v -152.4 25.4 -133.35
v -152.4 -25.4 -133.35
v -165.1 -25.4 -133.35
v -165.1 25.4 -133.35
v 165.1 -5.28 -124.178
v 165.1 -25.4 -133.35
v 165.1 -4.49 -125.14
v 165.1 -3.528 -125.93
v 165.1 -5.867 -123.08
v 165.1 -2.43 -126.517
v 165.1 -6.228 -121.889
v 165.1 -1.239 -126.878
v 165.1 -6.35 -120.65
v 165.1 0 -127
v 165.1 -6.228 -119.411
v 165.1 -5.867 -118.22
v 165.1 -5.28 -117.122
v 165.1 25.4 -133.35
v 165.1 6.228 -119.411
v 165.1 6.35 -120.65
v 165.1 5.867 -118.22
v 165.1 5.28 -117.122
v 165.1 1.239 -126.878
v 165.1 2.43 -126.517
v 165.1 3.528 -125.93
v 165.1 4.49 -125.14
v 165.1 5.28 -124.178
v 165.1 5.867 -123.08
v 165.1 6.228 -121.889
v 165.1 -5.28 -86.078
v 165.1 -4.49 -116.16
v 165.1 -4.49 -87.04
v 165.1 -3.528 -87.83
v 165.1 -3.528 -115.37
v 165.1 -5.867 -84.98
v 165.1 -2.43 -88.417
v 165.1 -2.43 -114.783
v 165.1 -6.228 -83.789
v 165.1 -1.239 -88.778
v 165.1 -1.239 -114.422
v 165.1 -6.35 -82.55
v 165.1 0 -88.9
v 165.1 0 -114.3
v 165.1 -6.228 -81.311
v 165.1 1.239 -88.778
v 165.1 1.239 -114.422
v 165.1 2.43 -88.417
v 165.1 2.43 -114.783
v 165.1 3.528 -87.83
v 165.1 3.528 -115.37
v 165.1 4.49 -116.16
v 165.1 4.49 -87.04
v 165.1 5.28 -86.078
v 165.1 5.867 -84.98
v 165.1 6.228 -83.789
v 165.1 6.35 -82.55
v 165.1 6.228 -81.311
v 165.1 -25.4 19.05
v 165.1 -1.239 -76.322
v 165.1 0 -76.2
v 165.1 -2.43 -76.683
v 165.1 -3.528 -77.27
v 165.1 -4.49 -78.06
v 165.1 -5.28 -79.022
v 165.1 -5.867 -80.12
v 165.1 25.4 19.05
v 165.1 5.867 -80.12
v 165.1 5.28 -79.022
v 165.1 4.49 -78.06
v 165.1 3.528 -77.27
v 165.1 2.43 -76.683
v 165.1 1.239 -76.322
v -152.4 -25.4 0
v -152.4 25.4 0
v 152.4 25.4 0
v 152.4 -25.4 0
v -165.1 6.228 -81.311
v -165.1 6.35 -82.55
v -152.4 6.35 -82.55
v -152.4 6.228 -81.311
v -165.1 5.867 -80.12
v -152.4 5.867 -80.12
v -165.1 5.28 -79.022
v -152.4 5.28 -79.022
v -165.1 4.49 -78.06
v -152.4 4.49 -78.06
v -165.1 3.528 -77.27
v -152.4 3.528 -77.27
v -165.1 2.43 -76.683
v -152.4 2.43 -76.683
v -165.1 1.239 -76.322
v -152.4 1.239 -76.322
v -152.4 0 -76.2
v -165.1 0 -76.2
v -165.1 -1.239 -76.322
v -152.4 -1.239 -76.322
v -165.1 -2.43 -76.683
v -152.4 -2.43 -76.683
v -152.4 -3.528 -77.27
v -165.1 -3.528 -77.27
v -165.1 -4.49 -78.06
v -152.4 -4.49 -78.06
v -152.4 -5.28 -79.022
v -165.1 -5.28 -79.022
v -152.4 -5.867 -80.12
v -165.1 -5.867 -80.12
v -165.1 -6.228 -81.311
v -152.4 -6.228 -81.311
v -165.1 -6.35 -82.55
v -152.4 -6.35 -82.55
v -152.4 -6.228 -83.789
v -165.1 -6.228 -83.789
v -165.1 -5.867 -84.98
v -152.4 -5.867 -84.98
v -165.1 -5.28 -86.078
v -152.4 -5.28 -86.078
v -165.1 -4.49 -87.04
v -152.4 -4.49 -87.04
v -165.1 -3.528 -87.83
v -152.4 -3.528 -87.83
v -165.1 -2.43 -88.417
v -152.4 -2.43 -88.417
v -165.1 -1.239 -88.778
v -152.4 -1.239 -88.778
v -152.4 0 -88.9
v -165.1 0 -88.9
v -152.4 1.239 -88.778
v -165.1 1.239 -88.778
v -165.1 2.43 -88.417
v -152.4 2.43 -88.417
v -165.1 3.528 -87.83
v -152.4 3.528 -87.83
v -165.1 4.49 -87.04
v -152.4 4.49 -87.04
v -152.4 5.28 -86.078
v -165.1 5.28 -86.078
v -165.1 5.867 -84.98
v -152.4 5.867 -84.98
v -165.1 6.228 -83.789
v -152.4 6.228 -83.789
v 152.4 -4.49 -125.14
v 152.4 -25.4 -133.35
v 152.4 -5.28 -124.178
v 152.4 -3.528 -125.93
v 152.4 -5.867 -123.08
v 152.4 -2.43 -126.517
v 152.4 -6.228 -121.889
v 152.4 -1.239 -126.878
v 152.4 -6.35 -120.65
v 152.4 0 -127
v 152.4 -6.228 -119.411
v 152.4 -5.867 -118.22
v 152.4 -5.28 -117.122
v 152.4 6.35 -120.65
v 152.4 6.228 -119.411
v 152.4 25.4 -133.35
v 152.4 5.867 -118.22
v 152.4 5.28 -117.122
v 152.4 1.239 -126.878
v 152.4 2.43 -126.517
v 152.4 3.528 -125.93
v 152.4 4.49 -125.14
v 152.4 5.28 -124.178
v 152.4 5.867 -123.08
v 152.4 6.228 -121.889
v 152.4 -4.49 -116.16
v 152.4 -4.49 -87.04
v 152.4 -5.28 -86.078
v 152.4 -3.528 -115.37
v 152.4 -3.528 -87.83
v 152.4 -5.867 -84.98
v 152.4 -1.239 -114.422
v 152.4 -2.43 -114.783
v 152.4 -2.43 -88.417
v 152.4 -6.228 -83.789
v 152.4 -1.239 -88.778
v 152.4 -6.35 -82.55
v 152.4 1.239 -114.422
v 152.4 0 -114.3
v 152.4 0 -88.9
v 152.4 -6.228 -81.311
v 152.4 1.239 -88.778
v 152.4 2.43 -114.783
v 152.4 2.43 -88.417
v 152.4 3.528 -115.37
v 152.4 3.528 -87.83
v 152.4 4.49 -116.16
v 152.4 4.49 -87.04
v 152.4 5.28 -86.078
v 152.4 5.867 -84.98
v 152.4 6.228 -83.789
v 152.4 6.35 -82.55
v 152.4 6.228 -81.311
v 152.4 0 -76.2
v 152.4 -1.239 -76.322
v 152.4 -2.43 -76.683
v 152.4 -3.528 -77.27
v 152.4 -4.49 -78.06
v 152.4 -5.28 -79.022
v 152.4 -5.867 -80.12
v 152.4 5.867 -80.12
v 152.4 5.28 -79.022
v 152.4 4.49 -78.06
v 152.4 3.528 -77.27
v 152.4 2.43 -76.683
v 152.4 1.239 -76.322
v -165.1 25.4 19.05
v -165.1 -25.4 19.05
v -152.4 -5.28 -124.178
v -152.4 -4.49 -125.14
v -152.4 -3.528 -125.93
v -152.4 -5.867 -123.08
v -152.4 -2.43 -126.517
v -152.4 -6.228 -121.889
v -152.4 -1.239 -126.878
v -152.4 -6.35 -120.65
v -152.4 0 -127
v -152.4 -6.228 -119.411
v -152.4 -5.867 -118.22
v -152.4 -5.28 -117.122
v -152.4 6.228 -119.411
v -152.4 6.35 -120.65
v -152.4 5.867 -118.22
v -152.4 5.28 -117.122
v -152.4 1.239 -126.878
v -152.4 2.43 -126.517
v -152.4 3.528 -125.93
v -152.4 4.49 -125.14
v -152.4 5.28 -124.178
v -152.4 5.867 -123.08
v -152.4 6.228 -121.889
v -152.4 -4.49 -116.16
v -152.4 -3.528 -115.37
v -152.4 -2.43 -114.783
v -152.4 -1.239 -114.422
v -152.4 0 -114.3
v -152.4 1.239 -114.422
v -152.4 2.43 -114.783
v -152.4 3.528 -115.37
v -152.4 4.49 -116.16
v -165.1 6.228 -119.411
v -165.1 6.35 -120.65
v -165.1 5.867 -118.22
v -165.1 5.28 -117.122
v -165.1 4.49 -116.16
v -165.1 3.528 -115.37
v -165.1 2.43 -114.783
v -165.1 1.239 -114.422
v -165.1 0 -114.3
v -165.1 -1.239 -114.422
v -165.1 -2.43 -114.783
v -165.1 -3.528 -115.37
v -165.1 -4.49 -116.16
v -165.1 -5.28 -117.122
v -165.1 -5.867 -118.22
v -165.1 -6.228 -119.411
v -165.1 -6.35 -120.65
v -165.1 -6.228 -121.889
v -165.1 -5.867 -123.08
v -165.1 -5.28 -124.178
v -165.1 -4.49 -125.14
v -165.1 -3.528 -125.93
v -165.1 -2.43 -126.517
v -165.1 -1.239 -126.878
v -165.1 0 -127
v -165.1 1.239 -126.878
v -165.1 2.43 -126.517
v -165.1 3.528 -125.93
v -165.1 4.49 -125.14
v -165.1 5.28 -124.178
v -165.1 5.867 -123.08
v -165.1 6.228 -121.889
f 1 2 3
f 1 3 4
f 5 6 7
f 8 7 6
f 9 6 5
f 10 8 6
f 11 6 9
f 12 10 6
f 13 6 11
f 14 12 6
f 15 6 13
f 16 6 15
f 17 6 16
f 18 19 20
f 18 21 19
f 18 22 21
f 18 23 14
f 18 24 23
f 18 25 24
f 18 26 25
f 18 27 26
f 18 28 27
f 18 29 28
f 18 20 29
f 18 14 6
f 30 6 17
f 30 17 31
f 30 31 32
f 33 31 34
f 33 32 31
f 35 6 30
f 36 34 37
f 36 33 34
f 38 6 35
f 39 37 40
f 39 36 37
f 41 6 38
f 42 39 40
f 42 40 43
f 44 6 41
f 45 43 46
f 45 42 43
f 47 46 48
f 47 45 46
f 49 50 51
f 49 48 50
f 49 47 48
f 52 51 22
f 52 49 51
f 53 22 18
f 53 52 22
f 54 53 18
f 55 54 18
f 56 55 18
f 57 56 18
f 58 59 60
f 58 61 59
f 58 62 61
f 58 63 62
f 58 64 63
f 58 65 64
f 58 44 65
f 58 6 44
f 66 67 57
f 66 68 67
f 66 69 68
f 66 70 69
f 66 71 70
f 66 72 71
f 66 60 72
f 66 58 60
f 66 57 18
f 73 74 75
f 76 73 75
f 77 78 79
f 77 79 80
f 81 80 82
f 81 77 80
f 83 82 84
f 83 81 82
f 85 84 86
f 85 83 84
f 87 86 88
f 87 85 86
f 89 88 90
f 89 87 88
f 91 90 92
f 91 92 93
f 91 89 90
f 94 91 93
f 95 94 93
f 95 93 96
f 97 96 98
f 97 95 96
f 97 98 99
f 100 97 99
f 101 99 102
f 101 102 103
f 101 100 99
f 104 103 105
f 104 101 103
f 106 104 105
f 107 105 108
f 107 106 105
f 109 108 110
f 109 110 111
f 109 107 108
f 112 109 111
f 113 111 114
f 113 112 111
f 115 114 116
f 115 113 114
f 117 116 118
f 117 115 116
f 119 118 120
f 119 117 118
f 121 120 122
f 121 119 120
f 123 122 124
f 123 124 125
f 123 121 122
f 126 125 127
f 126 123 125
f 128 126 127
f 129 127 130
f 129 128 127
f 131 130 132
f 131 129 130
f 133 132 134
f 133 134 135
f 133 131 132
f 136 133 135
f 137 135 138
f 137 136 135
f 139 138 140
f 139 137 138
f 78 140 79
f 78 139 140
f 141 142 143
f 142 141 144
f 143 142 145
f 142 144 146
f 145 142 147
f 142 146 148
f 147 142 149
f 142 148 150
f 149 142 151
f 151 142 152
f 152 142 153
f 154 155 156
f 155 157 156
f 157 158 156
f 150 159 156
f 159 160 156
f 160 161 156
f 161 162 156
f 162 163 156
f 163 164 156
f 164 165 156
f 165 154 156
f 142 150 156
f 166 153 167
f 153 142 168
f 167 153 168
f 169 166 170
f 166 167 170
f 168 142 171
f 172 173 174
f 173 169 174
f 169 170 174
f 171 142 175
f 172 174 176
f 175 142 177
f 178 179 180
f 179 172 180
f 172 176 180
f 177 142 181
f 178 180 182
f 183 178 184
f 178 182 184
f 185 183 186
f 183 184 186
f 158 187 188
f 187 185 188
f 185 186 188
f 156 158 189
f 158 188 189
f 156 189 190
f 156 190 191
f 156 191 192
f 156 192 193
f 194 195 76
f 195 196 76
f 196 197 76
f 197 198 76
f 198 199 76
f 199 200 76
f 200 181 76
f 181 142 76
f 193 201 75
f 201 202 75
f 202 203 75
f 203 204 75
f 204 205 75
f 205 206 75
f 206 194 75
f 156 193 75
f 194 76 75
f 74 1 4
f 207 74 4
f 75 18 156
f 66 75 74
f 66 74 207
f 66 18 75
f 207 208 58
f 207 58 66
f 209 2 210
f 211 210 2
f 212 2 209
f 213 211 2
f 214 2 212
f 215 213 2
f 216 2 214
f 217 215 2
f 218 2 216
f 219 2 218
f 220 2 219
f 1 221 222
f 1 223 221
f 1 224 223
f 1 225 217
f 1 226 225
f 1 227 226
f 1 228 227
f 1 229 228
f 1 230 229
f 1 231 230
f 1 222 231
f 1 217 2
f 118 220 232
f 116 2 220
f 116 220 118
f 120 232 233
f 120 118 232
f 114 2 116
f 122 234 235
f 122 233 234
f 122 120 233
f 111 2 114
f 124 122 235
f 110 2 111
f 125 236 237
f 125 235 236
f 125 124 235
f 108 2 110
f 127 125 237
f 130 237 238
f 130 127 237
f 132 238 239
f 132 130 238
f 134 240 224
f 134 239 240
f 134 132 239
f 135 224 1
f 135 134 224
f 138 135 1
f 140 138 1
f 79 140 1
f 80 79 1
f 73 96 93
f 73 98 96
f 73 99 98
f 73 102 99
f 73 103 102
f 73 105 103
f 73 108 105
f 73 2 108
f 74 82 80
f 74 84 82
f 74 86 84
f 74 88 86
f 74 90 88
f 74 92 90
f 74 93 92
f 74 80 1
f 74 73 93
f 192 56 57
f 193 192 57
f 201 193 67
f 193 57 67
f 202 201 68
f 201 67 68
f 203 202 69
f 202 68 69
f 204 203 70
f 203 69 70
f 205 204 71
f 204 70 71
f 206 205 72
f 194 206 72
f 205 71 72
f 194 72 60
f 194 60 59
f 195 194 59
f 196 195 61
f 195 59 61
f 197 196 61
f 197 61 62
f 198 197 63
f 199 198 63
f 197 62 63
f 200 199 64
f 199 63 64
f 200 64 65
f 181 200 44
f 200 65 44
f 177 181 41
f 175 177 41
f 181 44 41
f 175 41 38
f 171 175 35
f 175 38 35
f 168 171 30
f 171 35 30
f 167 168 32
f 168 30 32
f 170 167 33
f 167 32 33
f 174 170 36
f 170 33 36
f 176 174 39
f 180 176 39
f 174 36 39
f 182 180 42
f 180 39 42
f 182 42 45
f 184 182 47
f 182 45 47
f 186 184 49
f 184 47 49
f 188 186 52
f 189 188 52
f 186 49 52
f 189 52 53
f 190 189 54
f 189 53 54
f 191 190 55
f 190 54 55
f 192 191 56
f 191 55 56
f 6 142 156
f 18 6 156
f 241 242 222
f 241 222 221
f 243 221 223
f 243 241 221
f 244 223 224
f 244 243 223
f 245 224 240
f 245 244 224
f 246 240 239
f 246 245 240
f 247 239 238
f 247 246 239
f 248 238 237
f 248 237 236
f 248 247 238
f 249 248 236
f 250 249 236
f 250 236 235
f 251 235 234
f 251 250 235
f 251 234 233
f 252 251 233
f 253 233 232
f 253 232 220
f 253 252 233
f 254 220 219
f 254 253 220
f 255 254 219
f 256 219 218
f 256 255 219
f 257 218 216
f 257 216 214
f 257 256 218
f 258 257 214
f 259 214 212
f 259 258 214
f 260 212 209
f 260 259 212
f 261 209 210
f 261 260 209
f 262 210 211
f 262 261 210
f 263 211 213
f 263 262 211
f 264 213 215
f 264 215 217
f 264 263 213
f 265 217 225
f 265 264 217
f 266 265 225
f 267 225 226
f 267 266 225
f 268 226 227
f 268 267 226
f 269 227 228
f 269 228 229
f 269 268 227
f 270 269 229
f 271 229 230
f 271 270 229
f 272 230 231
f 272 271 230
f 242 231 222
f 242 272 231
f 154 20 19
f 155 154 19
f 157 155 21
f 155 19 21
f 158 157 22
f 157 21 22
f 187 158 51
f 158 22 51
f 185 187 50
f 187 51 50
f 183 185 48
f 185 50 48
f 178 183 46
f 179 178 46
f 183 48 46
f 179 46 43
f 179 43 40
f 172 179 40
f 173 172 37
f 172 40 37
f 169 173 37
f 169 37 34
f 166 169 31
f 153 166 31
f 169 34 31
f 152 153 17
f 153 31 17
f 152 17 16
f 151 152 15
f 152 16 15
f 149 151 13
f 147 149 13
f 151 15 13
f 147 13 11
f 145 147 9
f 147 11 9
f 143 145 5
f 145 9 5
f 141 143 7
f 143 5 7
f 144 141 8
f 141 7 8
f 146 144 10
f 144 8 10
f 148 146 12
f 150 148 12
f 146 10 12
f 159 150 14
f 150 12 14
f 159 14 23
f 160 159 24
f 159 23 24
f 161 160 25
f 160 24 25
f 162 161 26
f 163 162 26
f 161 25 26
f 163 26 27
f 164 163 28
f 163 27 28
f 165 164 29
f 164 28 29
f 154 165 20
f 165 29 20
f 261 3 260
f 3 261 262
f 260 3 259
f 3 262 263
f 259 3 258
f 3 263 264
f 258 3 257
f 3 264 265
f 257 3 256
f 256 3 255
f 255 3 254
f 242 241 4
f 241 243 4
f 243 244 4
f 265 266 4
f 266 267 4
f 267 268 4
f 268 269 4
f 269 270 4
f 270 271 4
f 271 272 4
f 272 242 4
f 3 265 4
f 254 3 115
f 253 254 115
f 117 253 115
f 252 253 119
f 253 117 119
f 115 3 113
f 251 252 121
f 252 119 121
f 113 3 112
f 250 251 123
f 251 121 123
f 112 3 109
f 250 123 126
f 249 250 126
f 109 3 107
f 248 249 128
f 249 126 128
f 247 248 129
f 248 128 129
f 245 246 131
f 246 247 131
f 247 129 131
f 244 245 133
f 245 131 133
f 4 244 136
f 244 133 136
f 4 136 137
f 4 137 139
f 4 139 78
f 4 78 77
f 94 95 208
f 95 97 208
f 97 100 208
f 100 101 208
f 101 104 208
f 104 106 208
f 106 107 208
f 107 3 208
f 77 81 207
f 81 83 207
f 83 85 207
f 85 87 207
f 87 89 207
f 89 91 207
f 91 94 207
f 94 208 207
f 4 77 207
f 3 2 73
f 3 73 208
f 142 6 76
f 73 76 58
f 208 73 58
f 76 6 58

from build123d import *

# Parameters (mm, degrees)
F0_W     = 304.8
F0_H     = 50.8
F1_DEPTH = 19.05
F2_W     = 50.8
F2_H     = 152.4
F3_DEPTH = 12.7
F4_R     = 6.35
F5_DEPTH = 12.7


# Not quite as in the source:
# - a pattern or mirror of a feature is missing from the dataset's text; its kind, count and spacing are read off the source's solid


with BuildPart() as f1:
    # F0 (on Top) → F1 (new body)
    with BuildSketch(Plane.XY):
        Rectangle(F0_W, F0_H)
    extrude(amount=F1_DEPTH)

    # F2 (on face) → F3 (join)
    with BuildSketch(Plane.YZ.offset(152.4)):
        with Locations((0, -57.15)):
            Rectangle(F2_W, F2_H)
    f3 = extrude(amount=F3_DEPTH)

    # F3_copies: F3 across plane
    add(f3.mirror(Plane(origin=(0, 0, 0), x_dir=(0, 0, -1), z_dir=(-1, 0, 0))))

    # F4 (on face) → F5 (cut, through all)
    with BuildSketch(Plane.YZ.offset(165.1)):
        with Locations((0, -120.65)):
            Circle(F4_R)
        with Locations((0, -82.55)):
            Circle(F4_R)
    f5 = extrude(amount=-F5_DEPTH, mode=Mode.SUBTRACT)

    # F5_copies: F5 across plane
    add(f5.mirror(Plane(origin=(0, 0, 0), x_dir=(0, 0, -1), z_dir=(-1, 0, 0))), mode=Mode.SUBTRACT)


solid = f1.part
